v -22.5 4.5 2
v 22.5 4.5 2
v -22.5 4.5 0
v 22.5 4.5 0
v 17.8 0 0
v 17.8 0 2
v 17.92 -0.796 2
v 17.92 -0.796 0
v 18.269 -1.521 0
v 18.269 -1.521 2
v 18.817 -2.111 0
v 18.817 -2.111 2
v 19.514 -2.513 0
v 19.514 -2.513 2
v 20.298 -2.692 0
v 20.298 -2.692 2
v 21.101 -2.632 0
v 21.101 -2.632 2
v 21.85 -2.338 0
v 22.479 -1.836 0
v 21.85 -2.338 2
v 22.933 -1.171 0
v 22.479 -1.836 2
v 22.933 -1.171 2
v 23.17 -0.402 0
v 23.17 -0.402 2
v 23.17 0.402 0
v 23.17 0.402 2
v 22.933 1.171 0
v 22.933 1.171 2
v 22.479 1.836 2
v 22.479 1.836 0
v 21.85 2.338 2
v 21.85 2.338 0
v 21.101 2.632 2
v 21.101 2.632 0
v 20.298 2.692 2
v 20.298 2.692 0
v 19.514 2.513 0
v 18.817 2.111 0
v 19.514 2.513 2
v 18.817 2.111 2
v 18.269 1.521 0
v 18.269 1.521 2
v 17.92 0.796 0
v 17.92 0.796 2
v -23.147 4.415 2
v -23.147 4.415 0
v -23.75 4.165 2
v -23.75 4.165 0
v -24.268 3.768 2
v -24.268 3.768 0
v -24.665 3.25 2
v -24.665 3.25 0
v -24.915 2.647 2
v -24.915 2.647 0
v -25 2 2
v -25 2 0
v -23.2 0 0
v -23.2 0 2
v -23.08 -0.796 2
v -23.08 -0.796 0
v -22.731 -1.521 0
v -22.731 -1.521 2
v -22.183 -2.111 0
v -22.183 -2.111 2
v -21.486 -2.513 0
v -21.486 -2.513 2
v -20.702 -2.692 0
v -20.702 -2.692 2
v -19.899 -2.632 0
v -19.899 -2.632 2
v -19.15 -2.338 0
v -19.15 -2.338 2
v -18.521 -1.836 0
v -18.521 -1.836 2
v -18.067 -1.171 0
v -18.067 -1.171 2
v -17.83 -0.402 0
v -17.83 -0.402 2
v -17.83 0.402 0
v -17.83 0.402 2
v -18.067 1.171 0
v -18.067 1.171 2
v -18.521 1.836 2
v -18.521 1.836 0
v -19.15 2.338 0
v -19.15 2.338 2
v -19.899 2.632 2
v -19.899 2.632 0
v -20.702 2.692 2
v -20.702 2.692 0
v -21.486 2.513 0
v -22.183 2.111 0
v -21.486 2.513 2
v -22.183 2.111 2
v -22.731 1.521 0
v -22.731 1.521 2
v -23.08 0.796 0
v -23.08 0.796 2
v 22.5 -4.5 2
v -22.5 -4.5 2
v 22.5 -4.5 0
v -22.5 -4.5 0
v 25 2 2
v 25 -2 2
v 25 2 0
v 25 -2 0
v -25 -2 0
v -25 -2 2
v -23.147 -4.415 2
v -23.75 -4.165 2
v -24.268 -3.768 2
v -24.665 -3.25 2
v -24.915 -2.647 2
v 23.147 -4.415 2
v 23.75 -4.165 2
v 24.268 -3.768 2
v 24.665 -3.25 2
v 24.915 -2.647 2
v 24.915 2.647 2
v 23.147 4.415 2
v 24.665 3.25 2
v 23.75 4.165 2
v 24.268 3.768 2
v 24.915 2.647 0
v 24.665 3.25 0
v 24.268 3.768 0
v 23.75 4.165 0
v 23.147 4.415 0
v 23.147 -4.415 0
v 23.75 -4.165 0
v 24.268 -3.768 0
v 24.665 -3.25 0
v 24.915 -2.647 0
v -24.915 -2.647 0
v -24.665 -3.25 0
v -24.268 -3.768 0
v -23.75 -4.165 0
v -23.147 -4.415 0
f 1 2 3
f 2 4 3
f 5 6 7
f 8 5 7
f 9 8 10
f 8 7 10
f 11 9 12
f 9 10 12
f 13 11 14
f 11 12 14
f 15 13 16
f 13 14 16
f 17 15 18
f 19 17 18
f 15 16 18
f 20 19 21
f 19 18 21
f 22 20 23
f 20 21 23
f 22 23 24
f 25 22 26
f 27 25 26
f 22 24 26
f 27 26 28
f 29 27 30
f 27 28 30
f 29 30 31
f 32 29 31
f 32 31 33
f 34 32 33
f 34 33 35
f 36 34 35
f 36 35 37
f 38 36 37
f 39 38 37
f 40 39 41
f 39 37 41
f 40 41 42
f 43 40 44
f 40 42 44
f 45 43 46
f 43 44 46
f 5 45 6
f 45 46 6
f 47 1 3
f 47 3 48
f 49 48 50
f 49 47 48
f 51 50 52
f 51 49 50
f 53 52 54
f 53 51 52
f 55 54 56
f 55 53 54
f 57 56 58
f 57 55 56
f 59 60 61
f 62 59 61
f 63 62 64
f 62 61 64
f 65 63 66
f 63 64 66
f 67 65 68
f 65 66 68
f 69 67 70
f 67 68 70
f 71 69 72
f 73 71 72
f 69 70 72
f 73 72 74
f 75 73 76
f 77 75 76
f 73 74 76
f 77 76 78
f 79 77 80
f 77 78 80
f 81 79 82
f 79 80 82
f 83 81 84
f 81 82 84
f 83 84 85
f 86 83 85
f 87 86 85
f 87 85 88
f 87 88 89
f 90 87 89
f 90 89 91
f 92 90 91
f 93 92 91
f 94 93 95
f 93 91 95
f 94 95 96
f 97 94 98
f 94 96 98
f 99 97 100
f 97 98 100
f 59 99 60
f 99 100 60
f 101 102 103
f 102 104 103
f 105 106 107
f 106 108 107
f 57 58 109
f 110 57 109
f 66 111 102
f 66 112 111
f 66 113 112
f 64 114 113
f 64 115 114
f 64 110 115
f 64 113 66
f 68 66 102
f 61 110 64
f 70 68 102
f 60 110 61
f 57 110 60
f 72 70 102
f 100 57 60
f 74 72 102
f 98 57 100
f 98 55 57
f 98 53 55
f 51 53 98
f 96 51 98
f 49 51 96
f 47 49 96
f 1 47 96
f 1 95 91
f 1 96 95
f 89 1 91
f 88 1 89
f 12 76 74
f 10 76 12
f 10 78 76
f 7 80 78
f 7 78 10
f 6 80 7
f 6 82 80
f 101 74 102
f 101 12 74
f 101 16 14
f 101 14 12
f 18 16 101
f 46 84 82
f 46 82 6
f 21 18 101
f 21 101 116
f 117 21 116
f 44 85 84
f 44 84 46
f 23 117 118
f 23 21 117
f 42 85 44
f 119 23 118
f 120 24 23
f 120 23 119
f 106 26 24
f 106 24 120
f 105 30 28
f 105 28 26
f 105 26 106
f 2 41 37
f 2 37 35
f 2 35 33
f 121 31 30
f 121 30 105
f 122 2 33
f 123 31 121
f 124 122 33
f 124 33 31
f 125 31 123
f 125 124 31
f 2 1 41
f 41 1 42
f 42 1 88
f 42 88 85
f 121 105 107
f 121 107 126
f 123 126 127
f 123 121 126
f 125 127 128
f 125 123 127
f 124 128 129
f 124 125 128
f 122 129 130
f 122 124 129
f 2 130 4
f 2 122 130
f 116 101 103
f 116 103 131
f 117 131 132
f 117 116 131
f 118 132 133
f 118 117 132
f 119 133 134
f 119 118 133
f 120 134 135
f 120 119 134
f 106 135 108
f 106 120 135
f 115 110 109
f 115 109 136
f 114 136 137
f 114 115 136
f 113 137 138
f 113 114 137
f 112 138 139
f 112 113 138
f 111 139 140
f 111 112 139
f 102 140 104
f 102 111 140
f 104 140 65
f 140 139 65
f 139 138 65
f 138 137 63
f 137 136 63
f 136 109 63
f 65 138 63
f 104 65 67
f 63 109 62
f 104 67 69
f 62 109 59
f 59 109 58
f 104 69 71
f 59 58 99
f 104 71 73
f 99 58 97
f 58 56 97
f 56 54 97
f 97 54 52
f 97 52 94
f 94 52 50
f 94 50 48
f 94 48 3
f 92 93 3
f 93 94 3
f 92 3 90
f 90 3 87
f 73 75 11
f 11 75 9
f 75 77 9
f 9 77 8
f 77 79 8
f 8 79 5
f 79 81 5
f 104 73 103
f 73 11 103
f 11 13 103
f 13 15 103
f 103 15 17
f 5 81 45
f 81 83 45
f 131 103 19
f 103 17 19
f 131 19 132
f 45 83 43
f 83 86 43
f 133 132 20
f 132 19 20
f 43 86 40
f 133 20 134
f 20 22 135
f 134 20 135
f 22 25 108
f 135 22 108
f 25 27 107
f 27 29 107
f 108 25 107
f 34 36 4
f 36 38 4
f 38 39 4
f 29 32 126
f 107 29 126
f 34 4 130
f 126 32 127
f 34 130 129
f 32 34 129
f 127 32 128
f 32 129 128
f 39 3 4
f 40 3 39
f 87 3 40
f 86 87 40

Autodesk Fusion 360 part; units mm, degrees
sketch "Sketch1" plane through (0, 0, 0) normal (0, 0, 1) x (1, 0, 0)
  line L0 (25, 4.5) -> (-25, 4.5)
  line L1 (-25, 4.5) -> (-25, -4.5)
  line L2 (-25, -4.5) -> (25, -4.5)
  line L3 (25, -4.5) -> (25, 4.5)
  line L4 (25, 4.5) -> (-25, -4.5) construction
  line L5 (-25, 4.5) -> (25, -4.5) construction
  dimension "d1" = 50
  dimension "d2" = 9
extrude "Extrude1" add sketch "Sketch1" along normal blind 2
fillet "Fillet1" radius 2.5 4 edges at (-25, -4.5, 1) (-25, 4.5, 1) (25, -4.5, 1) (25, 4.5, 1)
sketch "Sketch2" plane through (0, 0, 2) normal (0, 0, 1) x (-1, 0, 0)
  arc A0 (-25, -2) -> (-22.5, -4.5) centre (-22.5, -2) ccw
  line L0 (-22.5, -4.5) -> (22.5, -4.5)
  arc A1 (22.5, -4.5) -> (25, -2) centre (22.5, -2) ccw
  line L1 (22.5, 4.5) -> (-22.5, 4.5)
  line L2 (25, -2) -> (25, 2)
  arc A2 (25, 2) -> (22.5, 4.5) centre (22.5, 2) ccw
  arc A3 (-22.5, 4.5) -> (-25, 2) centre (-22.5, 2) ccw
  line L3 (-25, 2) -> (-25, -2)
  line L4 (25, 0) -> (-25, 0) construction
  line L5 (25, 0) -> (20.5, 0)
  line L6 (-25, 0) -> (-20.5, 0)
  circle A4 centre (20.5, 0) radius 2.7
  circle A5 centre (-20.5, 0) radius 2.7
  dimension "d11" = 4.5
  dimension "d12" = 4.5
  dimension "d13" = 5.4
  dimension "d14" = 5.4
extrude "Extrude2" cut sketch "Sketch2" against normal blind 2 contours A4 | A5
